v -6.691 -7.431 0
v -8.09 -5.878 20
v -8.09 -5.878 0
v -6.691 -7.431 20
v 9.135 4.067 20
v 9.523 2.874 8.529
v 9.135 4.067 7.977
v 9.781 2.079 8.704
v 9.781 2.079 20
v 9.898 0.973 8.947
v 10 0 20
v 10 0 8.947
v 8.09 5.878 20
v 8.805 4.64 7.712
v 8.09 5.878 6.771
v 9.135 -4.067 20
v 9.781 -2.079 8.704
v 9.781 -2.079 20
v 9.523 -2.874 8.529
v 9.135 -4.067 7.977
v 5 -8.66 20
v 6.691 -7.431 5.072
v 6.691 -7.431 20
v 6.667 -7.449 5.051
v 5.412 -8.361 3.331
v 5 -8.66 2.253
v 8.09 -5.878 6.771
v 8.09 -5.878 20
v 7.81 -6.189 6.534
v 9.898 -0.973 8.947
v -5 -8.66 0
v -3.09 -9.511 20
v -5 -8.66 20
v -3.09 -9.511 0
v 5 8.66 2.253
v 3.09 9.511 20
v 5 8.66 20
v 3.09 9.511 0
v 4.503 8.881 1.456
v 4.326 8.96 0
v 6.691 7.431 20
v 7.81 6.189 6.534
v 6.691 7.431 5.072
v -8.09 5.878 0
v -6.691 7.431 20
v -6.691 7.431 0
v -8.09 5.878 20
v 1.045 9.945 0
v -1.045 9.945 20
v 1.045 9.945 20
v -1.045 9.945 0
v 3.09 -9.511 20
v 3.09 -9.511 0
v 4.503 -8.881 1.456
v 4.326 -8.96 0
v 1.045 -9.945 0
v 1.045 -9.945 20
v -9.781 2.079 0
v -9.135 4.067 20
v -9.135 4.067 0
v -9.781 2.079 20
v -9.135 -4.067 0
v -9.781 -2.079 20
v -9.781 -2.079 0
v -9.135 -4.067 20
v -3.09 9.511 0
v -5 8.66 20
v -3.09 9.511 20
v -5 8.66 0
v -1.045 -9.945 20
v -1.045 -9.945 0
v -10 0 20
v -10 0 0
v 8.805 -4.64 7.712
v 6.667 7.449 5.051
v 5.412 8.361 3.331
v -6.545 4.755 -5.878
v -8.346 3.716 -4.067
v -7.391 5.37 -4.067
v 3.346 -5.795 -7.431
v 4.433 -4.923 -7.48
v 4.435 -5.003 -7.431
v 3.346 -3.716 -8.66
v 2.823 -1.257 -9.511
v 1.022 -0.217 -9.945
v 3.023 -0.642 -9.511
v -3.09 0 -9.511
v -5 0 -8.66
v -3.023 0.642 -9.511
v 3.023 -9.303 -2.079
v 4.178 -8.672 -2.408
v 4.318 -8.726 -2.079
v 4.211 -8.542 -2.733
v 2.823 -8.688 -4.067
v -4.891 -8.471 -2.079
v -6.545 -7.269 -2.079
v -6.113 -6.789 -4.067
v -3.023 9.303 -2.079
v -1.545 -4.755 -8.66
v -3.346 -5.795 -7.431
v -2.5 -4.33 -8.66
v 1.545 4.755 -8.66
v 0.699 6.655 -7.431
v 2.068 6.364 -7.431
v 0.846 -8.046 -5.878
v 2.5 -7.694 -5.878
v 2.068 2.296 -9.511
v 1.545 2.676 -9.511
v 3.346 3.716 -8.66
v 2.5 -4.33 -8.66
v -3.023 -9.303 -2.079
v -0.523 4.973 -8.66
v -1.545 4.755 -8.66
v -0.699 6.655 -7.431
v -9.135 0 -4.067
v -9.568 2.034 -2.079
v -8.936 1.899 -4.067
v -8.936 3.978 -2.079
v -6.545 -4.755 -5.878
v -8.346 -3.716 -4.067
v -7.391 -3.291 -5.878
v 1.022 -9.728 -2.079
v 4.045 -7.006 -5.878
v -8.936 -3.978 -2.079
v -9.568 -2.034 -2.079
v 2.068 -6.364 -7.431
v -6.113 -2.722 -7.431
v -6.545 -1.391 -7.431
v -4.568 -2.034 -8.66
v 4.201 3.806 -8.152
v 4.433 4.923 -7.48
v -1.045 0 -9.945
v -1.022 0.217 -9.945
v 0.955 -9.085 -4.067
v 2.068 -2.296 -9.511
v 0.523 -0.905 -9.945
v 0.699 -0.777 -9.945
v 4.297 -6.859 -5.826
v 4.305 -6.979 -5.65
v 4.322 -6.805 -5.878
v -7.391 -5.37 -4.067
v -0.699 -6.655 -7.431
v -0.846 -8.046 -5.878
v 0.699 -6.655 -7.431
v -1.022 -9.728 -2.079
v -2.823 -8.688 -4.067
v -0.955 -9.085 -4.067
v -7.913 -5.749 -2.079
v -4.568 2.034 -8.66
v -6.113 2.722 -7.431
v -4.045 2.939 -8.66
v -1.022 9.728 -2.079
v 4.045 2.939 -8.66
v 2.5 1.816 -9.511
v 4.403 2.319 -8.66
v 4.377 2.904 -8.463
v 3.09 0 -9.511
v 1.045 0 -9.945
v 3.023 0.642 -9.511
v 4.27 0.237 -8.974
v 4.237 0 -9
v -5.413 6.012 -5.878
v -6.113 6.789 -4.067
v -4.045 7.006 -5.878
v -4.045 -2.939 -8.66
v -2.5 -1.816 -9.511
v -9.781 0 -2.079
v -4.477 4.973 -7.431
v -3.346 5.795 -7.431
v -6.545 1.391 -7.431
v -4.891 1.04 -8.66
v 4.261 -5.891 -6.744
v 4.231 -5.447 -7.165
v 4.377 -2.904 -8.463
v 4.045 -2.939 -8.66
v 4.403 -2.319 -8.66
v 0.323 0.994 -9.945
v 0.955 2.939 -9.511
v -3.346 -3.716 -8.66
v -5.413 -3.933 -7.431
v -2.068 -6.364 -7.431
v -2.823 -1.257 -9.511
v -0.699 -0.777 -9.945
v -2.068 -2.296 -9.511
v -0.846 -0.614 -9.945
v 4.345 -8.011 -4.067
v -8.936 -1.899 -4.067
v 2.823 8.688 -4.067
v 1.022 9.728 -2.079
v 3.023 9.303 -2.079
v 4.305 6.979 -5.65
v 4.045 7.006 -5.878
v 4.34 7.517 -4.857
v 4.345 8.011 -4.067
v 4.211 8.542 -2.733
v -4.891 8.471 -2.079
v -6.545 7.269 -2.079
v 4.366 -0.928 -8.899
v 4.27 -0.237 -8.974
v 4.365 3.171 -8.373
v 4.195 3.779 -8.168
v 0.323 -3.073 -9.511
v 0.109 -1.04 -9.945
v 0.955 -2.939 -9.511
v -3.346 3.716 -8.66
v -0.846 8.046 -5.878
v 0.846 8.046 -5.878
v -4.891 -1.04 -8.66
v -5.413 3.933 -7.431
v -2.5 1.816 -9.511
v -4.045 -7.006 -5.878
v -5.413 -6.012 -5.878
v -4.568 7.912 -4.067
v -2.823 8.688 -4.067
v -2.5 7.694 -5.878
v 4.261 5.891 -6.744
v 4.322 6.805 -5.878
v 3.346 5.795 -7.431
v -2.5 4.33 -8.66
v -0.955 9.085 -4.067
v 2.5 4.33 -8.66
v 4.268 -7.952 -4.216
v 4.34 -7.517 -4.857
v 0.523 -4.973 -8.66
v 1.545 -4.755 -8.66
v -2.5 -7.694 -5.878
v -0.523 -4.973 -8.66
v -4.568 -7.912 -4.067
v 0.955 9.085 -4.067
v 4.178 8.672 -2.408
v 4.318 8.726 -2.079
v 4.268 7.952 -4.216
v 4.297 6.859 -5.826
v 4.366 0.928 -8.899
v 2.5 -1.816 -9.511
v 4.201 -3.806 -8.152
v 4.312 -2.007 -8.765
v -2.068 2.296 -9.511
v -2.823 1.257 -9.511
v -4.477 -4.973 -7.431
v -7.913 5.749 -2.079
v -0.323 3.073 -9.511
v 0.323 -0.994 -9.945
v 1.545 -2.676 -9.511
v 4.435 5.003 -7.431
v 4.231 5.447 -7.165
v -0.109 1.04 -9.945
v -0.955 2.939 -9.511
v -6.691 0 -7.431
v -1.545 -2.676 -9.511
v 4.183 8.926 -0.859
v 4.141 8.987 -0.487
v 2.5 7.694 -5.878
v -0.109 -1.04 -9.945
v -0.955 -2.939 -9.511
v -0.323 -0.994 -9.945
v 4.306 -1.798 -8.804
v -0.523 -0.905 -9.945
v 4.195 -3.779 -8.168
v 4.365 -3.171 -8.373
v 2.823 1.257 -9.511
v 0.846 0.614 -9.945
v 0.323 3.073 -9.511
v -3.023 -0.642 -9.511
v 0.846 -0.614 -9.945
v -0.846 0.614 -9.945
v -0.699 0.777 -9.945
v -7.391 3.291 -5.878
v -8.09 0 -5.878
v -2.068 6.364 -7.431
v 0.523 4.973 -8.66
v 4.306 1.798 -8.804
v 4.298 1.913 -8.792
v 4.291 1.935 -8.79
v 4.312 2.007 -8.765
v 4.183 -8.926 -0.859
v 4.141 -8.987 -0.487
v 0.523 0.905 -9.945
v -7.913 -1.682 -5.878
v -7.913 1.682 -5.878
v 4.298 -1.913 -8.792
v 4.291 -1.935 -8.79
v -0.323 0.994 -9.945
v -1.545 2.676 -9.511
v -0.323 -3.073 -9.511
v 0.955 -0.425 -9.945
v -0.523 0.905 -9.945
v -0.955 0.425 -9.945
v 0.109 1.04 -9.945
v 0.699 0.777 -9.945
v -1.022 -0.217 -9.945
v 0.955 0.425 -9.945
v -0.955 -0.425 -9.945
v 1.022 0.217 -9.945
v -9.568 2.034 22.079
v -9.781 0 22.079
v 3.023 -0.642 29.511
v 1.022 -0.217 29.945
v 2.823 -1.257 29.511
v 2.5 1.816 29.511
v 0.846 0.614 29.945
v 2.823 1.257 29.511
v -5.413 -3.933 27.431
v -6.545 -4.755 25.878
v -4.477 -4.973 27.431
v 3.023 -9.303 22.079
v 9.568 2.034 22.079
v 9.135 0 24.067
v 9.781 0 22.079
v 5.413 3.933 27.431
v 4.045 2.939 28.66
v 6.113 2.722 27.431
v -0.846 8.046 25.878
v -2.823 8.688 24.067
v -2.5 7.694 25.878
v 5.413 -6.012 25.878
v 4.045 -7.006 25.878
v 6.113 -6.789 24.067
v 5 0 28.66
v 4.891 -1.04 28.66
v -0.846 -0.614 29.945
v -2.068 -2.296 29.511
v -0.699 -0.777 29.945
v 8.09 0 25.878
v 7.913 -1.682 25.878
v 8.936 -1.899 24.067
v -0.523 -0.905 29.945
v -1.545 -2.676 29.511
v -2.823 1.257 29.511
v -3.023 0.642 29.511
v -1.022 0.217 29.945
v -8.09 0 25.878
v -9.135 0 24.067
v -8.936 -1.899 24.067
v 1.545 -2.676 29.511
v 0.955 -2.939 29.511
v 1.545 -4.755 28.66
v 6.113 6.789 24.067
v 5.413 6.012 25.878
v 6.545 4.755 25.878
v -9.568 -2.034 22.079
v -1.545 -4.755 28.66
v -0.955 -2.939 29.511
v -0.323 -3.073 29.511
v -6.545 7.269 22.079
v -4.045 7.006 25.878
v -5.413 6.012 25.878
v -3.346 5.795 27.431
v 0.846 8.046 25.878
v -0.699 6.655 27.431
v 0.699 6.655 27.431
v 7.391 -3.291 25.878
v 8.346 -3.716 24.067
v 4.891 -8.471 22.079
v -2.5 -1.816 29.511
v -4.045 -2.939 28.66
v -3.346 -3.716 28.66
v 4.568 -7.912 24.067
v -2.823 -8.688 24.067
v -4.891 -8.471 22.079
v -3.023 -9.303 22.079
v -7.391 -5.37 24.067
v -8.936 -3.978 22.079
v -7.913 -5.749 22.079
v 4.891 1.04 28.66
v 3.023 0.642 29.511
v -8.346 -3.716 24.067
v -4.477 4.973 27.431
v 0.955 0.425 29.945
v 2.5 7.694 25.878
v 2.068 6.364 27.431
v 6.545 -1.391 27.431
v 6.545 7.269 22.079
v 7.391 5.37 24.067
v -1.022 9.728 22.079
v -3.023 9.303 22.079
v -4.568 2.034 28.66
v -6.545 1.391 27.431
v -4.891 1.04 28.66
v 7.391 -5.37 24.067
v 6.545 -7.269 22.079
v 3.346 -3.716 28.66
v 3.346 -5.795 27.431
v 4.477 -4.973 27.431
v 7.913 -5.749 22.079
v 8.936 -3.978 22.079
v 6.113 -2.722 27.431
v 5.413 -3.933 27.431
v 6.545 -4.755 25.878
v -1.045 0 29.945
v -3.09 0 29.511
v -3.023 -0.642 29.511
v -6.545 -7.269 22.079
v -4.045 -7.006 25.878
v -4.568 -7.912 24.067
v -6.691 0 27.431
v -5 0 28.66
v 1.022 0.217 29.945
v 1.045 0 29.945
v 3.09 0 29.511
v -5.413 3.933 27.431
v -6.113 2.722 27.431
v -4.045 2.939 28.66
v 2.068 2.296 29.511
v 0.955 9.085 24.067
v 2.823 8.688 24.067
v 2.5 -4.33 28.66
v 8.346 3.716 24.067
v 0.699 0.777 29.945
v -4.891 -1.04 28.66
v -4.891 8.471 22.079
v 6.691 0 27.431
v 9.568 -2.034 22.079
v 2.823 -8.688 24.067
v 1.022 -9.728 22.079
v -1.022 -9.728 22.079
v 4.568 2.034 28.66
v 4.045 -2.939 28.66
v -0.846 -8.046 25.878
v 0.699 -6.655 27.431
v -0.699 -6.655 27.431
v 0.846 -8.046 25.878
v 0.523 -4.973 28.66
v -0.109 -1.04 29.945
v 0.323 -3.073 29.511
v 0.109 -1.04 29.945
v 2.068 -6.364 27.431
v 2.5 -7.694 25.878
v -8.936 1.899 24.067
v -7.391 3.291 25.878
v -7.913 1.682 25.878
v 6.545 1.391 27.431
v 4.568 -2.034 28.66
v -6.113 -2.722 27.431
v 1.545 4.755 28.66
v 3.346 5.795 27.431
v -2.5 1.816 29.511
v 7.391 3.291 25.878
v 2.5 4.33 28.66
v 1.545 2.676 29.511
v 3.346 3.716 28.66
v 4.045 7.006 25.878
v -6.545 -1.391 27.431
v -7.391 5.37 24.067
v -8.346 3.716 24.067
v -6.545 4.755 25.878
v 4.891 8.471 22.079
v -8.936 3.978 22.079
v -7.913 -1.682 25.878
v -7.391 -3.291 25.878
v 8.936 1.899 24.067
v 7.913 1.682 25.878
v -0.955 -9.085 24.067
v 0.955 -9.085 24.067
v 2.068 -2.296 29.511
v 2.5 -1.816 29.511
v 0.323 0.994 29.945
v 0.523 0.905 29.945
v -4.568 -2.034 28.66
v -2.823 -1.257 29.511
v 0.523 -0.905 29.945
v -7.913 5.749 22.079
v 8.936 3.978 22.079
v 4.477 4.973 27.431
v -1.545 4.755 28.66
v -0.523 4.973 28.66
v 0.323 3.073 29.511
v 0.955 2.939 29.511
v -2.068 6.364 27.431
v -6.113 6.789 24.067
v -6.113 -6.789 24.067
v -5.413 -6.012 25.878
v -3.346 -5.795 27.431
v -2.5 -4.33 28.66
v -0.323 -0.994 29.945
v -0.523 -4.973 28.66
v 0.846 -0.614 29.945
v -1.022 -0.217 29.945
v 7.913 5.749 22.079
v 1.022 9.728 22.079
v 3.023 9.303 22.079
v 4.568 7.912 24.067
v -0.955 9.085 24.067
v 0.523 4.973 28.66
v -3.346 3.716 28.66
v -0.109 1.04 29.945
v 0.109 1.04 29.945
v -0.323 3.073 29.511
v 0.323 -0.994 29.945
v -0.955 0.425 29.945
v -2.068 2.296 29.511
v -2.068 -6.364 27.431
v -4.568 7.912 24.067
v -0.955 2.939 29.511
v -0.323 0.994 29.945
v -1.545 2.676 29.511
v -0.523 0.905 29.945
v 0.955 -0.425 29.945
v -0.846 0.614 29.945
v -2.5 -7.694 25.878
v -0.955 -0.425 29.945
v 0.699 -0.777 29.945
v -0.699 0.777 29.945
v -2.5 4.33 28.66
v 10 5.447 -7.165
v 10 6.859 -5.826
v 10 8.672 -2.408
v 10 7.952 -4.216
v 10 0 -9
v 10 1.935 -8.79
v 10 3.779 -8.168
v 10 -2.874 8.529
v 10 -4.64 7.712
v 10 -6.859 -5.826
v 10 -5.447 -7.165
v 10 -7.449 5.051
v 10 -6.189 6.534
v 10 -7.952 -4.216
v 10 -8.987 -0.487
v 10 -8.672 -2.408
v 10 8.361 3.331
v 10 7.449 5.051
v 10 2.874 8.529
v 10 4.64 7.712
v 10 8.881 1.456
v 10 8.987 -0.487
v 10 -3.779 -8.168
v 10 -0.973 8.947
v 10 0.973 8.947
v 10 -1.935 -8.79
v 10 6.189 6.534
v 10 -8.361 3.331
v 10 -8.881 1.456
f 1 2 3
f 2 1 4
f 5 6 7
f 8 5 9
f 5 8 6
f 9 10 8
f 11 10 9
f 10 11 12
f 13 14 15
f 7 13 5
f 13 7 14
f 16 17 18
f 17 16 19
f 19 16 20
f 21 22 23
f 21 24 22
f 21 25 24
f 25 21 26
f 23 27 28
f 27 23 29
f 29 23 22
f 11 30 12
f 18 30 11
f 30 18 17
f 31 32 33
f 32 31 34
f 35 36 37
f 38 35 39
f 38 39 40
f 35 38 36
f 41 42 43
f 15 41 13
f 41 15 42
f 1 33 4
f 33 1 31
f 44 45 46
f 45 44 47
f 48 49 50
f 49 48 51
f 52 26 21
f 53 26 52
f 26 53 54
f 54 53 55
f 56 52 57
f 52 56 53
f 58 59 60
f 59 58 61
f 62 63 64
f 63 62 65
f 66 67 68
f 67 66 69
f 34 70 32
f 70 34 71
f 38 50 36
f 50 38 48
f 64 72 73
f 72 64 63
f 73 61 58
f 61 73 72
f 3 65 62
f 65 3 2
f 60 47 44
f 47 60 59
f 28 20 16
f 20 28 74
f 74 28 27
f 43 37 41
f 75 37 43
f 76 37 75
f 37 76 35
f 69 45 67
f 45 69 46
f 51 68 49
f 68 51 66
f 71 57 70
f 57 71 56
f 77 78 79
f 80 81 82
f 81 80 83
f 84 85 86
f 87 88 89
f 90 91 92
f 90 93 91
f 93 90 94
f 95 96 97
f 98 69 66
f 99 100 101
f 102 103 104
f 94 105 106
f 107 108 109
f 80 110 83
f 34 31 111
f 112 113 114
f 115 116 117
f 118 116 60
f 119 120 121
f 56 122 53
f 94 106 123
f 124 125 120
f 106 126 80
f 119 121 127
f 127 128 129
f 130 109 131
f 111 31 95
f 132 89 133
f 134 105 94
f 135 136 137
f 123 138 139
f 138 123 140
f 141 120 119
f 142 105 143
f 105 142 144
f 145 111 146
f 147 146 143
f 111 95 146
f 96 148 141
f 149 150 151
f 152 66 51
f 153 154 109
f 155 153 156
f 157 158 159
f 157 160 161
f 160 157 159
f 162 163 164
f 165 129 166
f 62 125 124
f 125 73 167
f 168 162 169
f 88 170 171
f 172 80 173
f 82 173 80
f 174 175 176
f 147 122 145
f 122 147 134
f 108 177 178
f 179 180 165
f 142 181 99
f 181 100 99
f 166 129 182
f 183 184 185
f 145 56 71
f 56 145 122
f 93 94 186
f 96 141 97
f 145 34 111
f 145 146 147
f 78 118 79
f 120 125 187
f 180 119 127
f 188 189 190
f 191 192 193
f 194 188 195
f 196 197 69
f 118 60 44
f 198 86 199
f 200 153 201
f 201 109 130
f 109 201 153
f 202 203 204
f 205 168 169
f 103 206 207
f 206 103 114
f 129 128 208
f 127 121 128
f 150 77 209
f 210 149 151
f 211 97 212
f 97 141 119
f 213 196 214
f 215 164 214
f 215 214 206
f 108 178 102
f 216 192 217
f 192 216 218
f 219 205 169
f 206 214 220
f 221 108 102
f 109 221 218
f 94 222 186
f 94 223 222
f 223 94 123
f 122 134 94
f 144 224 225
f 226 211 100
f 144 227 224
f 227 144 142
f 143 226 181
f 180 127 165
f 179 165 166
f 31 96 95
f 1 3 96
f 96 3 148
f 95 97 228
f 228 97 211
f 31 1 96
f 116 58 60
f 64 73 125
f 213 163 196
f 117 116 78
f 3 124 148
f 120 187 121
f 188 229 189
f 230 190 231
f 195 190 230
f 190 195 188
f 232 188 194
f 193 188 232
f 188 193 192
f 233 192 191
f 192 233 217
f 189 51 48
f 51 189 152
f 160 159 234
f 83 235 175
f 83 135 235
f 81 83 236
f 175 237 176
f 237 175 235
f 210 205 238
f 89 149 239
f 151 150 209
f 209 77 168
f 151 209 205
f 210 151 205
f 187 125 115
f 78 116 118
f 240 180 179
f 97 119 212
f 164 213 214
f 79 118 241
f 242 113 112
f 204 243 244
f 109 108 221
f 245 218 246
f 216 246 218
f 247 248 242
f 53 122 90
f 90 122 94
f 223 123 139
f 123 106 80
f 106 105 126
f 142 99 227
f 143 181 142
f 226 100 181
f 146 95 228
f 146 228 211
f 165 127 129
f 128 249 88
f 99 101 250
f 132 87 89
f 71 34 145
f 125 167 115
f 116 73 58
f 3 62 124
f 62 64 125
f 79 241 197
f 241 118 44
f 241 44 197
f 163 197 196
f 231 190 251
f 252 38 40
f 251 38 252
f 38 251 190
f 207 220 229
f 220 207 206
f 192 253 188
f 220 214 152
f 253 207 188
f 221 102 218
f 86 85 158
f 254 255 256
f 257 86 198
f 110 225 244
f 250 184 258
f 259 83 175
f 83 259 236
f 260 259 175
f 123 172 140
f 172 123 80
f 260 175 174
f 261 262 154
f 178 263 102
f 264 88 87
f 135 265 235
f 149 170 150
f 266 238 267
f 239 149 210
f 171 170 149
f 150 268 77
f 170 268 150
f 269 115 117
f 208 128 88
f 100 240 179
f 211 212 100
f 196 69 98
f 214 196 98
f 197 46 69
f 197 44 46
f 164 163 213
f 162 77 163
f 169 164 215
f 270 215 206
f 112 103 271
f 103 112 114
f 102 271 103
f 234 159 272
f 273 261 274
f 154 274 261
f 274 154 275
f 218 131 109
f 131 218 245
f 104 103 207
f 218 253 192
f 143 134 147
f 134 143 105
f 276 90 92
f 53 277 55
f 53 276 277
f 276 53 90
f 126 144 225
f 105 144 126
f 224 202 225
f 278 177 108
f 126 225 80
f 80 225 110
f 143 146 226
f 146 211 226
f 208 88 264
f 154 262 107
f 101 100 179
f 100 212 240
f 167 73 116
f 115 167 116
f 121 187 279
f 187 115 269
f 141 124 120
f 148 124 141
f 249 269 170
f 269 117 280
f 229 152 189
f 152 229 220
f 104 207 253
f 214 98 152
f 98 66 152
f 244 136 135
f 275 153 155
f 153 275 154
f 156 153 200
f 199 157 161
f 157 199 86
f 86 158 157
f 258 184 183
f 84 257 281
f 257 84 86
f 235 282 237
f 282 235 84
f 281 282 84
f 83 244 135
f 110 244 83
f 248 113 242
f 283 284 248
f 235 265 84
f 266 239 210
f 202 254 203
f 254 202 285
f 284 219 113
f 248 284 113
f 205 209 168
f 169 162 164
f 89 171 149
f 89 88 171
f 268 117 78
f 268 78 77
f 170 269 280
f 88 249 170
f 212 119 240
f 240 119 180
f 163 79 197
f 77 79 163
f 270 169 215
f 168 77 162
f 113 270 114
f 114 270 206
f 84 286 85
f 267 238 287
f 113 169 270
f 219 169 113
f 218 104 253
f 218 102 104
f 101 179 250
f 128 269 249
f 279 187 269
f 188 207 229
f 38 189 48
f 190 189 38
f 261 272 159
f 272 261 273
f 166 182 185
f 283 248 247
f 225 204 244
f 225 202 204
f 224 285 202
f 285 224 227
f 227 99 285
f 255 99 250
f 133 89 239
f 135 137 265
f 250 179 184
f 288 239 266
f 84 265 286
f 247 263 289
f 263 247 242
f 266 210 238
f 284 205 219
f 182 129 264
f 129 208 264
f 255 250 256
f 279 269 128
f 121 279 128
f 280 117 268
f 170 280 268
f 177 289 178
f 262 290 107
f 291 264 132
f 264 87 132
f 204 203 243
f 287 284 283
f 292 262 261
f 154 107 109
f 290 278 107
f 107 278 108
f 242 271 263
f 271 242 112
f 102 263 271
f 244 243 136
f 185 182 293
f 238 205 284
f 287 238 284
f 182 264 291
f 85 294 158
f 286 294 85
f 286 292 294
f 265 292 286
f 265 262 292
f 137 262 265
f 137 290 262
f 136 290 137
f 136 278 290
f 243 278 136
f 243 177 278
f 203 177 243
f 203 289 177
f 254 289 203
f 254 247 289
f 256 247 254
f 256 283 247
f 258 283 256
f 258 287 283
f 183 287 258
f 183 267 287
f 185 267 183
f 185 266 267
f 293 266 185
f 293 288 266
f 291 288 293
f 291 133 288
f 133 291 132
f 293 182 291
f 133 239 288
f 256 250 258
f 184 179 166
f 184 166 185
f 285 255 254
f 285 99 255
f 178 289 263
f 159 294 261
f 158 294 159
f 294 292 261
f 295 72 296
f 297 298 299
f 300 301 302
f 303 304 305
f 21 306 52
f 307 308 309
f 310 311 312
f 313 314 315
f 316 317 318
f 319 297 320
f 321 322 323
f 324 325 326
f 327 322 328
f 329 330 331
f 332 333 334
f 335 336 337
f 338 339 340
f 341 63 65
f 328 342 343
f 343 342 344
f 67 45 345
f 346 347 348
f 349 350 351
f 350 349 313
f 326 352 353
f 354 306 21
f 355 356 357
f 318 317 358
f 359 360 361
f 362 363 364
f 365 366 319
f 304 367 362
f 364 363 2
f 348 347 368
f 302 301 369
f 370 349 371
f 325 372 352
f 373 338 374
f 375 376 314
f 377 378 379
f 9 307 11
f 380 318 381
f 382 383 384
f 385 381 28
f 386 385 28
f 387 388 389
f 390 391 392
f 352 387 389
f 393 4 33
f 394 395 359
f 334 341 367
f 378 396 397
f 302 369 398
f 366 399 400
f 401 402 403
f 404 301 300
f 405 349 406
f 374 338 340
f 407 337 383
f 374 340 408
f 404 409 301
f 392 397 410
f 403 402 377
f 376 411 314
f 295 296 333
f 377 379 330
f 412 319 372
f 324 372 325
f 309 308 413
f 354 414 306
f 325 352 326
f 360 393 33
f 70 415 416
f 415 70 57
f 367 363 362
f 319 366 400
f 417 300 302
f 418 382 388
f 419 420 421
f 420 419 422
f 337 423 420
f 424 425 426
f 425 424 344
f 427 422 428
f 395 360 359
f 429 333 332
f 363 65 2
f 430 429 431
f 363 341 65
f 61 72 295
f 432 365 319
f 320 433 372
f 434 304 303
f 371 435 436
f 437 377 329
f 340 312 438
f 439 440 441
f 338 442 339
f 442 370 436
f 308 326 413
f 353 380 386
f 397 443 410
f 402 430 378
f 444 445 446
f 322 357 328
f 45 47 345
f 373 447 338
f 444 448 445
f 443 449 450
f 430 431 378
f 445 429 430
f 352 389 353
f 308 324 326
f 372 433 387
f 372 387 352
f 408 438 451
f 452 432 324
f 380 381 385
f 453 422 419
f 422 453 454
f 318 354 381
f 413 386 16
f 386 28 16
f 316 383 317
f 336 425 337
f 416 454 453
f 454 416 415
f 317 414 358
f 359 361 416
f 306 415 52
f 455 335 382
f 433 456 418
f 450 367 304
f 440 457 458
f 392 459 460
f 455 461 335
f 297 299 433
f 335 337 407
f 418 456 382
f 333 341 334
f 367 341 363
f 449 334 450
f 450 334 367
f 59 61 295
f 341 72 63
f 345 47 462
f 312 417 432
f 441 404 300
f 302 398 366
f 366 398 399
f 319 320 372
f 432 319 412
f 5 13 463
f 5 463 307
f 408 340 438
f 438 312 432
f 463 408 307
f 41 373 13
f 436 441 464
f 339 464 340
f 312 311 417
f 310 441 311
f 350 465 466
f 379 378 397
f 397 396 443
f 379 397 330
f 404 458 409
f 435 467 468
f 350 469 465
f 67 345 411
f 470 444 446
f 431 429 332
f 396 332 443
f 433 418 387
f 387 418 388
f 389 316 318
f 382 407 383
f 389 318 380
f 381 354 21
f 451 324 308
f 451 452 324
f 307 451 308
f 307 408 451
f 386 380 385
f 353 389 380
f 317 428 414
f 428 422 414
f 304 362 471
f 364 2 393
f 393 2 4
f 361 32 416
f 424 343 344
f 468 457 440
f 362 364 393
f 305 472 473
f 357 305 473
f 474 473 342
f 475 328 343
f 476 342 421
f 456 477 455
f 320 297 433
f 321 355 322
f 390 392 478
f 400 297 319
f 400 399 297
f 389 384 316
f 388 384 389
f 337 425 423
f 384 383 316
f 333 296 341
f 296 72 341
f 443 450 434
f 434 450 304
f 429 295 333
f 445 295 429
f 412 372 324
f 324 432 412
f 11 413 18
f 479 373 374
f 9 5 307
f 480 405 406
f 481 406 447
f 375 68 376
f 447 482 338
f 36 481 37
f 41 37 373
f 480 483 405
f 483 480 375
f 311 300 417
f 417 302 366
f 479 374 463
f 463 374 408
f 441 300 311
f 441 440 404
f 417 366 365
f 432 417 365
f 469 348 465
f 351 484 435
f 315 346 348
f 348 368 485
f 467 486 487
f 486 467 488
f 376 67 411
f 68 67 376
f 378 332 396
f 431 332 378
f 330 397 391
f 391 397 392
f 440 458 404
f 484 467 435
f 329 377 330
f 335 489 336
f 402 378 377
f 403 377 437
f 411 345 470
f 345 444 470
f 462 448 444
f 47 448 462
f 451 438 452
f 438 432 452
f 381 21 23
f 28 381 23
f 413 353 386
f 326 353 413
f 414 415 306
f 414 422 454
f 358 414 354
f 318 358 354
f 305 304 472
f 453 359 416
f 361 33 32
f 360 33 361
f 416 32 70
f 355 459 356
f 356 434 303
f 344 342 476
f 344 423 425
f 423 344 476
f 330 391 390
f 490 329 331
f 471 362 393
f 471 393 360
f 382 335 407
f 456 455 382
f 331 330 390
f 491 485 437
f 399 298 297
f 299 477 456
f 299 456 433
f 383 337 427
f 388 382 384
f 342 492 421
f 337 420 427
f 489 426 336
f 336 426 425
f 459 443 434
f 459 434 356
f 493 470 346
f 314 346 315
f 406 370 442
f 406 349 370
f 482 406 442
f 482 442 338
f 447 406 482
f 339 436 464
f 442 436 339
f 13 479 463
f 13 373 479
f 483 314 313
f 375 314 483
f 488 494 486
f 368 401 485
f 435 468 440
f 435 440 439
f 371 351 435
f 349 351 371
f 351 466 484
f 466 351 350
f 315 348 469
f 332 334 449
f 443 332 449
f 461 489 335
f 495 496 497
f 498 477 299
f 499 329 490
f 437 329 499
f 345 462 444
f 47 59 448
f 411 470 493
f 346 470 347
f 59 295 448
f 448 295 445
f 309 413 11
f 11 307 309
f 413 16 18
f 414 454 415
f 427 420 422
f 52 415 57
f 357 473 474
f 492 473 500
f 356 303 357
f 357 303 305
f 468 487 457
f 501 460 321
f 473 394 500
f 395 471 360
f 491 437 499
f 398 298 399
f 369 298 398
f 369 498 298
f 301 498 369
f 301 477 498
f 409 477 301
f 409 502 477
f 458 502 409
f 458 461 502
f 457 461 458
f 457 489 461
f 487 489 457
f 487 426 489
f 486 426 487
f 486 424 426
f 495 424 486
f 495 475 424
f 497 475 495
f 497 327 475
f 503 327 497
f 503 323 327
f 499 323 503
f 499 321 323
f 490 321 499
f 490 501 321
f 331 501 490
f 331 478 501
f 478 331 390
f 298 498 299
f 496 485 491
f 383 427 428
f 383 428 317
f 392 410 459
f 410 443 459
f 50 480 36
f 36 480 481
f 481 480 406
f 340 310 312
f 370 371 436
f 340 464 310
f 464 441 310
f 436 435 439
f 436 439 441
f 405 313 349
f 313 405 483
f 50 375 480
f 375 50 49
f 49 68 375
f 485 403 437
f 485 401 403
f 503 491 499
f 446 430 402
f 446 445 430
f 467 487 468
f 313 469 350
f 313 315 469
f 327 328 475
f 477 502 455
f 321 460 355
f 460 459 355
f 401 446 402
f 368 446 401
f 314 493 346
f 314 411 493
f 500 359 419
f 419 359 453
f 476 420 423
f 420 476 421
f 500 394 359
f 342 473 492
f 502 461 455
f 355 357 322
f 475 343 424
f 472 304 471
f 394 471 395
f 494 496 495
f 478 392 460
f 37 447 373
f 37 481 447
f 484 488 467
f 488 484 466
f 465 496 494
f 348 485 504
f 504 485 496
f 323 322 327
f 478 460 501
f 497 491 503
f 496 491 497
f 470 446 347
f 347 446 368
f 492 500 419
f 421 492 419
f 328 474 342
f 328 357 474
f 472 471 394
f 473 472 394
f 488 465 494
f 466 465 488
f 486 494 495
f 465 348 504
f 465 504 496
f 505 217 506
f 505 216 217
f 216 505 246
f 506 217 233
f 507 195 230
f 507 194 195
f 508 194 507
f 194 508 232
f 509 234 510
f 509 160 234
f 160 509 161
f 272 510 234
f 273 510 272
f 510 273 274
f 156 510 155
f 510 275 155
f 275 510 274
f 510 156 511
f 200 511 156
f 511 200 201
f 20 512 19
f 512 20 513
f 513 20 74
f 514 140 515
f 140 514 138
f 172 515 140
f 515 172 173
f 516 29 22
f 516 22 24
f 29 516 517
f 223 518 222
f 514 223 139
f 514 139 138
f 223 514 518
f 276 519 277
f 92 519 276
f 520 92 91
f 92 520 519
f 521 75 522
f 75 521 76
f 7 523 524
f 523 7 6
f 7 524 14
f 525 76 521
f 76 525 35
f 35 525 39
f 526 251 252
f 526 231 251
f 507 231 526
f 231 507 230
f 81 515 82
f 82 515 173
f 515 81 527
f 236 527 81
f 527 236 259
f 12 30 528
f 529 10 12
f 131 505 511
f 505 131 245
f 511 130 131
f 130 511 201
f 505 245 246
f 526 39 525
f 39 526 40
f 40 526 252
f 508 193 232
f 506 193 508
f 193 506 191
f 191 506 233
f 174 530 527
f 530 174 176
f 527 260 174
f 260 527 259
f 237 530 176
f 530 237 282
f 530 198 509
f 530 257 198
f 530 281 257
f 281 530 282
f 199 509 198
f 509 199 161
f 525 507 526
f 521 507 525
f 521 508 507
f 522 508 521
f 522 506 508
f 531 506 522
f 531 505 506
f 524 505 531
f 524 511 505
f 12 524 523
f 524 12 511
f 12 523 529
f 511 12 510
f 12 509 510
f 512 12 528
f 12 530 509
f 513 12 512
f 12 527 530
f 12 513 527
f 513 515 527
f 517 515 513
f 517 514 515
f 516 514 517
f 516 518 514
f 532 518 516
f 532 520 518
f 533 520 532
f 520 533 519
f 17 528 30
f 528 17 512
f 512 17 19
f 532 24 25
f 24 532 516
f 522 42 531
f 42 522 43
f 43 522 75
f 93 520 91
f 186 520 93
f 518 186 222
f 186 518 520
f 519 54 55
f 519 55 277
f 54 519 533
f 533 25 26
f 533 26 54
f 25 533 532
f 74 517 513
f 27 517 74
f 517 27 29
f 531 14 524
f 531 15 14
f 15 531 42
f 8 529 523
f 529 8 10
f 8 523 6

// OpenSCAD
cylinder(20,10,10);
sphere(10);
sphere(10);
translate([0,0,20])
sphere(10);
cylinder(10,10,5);
rotate([90,90,90])
cylinder(10,9,9);
